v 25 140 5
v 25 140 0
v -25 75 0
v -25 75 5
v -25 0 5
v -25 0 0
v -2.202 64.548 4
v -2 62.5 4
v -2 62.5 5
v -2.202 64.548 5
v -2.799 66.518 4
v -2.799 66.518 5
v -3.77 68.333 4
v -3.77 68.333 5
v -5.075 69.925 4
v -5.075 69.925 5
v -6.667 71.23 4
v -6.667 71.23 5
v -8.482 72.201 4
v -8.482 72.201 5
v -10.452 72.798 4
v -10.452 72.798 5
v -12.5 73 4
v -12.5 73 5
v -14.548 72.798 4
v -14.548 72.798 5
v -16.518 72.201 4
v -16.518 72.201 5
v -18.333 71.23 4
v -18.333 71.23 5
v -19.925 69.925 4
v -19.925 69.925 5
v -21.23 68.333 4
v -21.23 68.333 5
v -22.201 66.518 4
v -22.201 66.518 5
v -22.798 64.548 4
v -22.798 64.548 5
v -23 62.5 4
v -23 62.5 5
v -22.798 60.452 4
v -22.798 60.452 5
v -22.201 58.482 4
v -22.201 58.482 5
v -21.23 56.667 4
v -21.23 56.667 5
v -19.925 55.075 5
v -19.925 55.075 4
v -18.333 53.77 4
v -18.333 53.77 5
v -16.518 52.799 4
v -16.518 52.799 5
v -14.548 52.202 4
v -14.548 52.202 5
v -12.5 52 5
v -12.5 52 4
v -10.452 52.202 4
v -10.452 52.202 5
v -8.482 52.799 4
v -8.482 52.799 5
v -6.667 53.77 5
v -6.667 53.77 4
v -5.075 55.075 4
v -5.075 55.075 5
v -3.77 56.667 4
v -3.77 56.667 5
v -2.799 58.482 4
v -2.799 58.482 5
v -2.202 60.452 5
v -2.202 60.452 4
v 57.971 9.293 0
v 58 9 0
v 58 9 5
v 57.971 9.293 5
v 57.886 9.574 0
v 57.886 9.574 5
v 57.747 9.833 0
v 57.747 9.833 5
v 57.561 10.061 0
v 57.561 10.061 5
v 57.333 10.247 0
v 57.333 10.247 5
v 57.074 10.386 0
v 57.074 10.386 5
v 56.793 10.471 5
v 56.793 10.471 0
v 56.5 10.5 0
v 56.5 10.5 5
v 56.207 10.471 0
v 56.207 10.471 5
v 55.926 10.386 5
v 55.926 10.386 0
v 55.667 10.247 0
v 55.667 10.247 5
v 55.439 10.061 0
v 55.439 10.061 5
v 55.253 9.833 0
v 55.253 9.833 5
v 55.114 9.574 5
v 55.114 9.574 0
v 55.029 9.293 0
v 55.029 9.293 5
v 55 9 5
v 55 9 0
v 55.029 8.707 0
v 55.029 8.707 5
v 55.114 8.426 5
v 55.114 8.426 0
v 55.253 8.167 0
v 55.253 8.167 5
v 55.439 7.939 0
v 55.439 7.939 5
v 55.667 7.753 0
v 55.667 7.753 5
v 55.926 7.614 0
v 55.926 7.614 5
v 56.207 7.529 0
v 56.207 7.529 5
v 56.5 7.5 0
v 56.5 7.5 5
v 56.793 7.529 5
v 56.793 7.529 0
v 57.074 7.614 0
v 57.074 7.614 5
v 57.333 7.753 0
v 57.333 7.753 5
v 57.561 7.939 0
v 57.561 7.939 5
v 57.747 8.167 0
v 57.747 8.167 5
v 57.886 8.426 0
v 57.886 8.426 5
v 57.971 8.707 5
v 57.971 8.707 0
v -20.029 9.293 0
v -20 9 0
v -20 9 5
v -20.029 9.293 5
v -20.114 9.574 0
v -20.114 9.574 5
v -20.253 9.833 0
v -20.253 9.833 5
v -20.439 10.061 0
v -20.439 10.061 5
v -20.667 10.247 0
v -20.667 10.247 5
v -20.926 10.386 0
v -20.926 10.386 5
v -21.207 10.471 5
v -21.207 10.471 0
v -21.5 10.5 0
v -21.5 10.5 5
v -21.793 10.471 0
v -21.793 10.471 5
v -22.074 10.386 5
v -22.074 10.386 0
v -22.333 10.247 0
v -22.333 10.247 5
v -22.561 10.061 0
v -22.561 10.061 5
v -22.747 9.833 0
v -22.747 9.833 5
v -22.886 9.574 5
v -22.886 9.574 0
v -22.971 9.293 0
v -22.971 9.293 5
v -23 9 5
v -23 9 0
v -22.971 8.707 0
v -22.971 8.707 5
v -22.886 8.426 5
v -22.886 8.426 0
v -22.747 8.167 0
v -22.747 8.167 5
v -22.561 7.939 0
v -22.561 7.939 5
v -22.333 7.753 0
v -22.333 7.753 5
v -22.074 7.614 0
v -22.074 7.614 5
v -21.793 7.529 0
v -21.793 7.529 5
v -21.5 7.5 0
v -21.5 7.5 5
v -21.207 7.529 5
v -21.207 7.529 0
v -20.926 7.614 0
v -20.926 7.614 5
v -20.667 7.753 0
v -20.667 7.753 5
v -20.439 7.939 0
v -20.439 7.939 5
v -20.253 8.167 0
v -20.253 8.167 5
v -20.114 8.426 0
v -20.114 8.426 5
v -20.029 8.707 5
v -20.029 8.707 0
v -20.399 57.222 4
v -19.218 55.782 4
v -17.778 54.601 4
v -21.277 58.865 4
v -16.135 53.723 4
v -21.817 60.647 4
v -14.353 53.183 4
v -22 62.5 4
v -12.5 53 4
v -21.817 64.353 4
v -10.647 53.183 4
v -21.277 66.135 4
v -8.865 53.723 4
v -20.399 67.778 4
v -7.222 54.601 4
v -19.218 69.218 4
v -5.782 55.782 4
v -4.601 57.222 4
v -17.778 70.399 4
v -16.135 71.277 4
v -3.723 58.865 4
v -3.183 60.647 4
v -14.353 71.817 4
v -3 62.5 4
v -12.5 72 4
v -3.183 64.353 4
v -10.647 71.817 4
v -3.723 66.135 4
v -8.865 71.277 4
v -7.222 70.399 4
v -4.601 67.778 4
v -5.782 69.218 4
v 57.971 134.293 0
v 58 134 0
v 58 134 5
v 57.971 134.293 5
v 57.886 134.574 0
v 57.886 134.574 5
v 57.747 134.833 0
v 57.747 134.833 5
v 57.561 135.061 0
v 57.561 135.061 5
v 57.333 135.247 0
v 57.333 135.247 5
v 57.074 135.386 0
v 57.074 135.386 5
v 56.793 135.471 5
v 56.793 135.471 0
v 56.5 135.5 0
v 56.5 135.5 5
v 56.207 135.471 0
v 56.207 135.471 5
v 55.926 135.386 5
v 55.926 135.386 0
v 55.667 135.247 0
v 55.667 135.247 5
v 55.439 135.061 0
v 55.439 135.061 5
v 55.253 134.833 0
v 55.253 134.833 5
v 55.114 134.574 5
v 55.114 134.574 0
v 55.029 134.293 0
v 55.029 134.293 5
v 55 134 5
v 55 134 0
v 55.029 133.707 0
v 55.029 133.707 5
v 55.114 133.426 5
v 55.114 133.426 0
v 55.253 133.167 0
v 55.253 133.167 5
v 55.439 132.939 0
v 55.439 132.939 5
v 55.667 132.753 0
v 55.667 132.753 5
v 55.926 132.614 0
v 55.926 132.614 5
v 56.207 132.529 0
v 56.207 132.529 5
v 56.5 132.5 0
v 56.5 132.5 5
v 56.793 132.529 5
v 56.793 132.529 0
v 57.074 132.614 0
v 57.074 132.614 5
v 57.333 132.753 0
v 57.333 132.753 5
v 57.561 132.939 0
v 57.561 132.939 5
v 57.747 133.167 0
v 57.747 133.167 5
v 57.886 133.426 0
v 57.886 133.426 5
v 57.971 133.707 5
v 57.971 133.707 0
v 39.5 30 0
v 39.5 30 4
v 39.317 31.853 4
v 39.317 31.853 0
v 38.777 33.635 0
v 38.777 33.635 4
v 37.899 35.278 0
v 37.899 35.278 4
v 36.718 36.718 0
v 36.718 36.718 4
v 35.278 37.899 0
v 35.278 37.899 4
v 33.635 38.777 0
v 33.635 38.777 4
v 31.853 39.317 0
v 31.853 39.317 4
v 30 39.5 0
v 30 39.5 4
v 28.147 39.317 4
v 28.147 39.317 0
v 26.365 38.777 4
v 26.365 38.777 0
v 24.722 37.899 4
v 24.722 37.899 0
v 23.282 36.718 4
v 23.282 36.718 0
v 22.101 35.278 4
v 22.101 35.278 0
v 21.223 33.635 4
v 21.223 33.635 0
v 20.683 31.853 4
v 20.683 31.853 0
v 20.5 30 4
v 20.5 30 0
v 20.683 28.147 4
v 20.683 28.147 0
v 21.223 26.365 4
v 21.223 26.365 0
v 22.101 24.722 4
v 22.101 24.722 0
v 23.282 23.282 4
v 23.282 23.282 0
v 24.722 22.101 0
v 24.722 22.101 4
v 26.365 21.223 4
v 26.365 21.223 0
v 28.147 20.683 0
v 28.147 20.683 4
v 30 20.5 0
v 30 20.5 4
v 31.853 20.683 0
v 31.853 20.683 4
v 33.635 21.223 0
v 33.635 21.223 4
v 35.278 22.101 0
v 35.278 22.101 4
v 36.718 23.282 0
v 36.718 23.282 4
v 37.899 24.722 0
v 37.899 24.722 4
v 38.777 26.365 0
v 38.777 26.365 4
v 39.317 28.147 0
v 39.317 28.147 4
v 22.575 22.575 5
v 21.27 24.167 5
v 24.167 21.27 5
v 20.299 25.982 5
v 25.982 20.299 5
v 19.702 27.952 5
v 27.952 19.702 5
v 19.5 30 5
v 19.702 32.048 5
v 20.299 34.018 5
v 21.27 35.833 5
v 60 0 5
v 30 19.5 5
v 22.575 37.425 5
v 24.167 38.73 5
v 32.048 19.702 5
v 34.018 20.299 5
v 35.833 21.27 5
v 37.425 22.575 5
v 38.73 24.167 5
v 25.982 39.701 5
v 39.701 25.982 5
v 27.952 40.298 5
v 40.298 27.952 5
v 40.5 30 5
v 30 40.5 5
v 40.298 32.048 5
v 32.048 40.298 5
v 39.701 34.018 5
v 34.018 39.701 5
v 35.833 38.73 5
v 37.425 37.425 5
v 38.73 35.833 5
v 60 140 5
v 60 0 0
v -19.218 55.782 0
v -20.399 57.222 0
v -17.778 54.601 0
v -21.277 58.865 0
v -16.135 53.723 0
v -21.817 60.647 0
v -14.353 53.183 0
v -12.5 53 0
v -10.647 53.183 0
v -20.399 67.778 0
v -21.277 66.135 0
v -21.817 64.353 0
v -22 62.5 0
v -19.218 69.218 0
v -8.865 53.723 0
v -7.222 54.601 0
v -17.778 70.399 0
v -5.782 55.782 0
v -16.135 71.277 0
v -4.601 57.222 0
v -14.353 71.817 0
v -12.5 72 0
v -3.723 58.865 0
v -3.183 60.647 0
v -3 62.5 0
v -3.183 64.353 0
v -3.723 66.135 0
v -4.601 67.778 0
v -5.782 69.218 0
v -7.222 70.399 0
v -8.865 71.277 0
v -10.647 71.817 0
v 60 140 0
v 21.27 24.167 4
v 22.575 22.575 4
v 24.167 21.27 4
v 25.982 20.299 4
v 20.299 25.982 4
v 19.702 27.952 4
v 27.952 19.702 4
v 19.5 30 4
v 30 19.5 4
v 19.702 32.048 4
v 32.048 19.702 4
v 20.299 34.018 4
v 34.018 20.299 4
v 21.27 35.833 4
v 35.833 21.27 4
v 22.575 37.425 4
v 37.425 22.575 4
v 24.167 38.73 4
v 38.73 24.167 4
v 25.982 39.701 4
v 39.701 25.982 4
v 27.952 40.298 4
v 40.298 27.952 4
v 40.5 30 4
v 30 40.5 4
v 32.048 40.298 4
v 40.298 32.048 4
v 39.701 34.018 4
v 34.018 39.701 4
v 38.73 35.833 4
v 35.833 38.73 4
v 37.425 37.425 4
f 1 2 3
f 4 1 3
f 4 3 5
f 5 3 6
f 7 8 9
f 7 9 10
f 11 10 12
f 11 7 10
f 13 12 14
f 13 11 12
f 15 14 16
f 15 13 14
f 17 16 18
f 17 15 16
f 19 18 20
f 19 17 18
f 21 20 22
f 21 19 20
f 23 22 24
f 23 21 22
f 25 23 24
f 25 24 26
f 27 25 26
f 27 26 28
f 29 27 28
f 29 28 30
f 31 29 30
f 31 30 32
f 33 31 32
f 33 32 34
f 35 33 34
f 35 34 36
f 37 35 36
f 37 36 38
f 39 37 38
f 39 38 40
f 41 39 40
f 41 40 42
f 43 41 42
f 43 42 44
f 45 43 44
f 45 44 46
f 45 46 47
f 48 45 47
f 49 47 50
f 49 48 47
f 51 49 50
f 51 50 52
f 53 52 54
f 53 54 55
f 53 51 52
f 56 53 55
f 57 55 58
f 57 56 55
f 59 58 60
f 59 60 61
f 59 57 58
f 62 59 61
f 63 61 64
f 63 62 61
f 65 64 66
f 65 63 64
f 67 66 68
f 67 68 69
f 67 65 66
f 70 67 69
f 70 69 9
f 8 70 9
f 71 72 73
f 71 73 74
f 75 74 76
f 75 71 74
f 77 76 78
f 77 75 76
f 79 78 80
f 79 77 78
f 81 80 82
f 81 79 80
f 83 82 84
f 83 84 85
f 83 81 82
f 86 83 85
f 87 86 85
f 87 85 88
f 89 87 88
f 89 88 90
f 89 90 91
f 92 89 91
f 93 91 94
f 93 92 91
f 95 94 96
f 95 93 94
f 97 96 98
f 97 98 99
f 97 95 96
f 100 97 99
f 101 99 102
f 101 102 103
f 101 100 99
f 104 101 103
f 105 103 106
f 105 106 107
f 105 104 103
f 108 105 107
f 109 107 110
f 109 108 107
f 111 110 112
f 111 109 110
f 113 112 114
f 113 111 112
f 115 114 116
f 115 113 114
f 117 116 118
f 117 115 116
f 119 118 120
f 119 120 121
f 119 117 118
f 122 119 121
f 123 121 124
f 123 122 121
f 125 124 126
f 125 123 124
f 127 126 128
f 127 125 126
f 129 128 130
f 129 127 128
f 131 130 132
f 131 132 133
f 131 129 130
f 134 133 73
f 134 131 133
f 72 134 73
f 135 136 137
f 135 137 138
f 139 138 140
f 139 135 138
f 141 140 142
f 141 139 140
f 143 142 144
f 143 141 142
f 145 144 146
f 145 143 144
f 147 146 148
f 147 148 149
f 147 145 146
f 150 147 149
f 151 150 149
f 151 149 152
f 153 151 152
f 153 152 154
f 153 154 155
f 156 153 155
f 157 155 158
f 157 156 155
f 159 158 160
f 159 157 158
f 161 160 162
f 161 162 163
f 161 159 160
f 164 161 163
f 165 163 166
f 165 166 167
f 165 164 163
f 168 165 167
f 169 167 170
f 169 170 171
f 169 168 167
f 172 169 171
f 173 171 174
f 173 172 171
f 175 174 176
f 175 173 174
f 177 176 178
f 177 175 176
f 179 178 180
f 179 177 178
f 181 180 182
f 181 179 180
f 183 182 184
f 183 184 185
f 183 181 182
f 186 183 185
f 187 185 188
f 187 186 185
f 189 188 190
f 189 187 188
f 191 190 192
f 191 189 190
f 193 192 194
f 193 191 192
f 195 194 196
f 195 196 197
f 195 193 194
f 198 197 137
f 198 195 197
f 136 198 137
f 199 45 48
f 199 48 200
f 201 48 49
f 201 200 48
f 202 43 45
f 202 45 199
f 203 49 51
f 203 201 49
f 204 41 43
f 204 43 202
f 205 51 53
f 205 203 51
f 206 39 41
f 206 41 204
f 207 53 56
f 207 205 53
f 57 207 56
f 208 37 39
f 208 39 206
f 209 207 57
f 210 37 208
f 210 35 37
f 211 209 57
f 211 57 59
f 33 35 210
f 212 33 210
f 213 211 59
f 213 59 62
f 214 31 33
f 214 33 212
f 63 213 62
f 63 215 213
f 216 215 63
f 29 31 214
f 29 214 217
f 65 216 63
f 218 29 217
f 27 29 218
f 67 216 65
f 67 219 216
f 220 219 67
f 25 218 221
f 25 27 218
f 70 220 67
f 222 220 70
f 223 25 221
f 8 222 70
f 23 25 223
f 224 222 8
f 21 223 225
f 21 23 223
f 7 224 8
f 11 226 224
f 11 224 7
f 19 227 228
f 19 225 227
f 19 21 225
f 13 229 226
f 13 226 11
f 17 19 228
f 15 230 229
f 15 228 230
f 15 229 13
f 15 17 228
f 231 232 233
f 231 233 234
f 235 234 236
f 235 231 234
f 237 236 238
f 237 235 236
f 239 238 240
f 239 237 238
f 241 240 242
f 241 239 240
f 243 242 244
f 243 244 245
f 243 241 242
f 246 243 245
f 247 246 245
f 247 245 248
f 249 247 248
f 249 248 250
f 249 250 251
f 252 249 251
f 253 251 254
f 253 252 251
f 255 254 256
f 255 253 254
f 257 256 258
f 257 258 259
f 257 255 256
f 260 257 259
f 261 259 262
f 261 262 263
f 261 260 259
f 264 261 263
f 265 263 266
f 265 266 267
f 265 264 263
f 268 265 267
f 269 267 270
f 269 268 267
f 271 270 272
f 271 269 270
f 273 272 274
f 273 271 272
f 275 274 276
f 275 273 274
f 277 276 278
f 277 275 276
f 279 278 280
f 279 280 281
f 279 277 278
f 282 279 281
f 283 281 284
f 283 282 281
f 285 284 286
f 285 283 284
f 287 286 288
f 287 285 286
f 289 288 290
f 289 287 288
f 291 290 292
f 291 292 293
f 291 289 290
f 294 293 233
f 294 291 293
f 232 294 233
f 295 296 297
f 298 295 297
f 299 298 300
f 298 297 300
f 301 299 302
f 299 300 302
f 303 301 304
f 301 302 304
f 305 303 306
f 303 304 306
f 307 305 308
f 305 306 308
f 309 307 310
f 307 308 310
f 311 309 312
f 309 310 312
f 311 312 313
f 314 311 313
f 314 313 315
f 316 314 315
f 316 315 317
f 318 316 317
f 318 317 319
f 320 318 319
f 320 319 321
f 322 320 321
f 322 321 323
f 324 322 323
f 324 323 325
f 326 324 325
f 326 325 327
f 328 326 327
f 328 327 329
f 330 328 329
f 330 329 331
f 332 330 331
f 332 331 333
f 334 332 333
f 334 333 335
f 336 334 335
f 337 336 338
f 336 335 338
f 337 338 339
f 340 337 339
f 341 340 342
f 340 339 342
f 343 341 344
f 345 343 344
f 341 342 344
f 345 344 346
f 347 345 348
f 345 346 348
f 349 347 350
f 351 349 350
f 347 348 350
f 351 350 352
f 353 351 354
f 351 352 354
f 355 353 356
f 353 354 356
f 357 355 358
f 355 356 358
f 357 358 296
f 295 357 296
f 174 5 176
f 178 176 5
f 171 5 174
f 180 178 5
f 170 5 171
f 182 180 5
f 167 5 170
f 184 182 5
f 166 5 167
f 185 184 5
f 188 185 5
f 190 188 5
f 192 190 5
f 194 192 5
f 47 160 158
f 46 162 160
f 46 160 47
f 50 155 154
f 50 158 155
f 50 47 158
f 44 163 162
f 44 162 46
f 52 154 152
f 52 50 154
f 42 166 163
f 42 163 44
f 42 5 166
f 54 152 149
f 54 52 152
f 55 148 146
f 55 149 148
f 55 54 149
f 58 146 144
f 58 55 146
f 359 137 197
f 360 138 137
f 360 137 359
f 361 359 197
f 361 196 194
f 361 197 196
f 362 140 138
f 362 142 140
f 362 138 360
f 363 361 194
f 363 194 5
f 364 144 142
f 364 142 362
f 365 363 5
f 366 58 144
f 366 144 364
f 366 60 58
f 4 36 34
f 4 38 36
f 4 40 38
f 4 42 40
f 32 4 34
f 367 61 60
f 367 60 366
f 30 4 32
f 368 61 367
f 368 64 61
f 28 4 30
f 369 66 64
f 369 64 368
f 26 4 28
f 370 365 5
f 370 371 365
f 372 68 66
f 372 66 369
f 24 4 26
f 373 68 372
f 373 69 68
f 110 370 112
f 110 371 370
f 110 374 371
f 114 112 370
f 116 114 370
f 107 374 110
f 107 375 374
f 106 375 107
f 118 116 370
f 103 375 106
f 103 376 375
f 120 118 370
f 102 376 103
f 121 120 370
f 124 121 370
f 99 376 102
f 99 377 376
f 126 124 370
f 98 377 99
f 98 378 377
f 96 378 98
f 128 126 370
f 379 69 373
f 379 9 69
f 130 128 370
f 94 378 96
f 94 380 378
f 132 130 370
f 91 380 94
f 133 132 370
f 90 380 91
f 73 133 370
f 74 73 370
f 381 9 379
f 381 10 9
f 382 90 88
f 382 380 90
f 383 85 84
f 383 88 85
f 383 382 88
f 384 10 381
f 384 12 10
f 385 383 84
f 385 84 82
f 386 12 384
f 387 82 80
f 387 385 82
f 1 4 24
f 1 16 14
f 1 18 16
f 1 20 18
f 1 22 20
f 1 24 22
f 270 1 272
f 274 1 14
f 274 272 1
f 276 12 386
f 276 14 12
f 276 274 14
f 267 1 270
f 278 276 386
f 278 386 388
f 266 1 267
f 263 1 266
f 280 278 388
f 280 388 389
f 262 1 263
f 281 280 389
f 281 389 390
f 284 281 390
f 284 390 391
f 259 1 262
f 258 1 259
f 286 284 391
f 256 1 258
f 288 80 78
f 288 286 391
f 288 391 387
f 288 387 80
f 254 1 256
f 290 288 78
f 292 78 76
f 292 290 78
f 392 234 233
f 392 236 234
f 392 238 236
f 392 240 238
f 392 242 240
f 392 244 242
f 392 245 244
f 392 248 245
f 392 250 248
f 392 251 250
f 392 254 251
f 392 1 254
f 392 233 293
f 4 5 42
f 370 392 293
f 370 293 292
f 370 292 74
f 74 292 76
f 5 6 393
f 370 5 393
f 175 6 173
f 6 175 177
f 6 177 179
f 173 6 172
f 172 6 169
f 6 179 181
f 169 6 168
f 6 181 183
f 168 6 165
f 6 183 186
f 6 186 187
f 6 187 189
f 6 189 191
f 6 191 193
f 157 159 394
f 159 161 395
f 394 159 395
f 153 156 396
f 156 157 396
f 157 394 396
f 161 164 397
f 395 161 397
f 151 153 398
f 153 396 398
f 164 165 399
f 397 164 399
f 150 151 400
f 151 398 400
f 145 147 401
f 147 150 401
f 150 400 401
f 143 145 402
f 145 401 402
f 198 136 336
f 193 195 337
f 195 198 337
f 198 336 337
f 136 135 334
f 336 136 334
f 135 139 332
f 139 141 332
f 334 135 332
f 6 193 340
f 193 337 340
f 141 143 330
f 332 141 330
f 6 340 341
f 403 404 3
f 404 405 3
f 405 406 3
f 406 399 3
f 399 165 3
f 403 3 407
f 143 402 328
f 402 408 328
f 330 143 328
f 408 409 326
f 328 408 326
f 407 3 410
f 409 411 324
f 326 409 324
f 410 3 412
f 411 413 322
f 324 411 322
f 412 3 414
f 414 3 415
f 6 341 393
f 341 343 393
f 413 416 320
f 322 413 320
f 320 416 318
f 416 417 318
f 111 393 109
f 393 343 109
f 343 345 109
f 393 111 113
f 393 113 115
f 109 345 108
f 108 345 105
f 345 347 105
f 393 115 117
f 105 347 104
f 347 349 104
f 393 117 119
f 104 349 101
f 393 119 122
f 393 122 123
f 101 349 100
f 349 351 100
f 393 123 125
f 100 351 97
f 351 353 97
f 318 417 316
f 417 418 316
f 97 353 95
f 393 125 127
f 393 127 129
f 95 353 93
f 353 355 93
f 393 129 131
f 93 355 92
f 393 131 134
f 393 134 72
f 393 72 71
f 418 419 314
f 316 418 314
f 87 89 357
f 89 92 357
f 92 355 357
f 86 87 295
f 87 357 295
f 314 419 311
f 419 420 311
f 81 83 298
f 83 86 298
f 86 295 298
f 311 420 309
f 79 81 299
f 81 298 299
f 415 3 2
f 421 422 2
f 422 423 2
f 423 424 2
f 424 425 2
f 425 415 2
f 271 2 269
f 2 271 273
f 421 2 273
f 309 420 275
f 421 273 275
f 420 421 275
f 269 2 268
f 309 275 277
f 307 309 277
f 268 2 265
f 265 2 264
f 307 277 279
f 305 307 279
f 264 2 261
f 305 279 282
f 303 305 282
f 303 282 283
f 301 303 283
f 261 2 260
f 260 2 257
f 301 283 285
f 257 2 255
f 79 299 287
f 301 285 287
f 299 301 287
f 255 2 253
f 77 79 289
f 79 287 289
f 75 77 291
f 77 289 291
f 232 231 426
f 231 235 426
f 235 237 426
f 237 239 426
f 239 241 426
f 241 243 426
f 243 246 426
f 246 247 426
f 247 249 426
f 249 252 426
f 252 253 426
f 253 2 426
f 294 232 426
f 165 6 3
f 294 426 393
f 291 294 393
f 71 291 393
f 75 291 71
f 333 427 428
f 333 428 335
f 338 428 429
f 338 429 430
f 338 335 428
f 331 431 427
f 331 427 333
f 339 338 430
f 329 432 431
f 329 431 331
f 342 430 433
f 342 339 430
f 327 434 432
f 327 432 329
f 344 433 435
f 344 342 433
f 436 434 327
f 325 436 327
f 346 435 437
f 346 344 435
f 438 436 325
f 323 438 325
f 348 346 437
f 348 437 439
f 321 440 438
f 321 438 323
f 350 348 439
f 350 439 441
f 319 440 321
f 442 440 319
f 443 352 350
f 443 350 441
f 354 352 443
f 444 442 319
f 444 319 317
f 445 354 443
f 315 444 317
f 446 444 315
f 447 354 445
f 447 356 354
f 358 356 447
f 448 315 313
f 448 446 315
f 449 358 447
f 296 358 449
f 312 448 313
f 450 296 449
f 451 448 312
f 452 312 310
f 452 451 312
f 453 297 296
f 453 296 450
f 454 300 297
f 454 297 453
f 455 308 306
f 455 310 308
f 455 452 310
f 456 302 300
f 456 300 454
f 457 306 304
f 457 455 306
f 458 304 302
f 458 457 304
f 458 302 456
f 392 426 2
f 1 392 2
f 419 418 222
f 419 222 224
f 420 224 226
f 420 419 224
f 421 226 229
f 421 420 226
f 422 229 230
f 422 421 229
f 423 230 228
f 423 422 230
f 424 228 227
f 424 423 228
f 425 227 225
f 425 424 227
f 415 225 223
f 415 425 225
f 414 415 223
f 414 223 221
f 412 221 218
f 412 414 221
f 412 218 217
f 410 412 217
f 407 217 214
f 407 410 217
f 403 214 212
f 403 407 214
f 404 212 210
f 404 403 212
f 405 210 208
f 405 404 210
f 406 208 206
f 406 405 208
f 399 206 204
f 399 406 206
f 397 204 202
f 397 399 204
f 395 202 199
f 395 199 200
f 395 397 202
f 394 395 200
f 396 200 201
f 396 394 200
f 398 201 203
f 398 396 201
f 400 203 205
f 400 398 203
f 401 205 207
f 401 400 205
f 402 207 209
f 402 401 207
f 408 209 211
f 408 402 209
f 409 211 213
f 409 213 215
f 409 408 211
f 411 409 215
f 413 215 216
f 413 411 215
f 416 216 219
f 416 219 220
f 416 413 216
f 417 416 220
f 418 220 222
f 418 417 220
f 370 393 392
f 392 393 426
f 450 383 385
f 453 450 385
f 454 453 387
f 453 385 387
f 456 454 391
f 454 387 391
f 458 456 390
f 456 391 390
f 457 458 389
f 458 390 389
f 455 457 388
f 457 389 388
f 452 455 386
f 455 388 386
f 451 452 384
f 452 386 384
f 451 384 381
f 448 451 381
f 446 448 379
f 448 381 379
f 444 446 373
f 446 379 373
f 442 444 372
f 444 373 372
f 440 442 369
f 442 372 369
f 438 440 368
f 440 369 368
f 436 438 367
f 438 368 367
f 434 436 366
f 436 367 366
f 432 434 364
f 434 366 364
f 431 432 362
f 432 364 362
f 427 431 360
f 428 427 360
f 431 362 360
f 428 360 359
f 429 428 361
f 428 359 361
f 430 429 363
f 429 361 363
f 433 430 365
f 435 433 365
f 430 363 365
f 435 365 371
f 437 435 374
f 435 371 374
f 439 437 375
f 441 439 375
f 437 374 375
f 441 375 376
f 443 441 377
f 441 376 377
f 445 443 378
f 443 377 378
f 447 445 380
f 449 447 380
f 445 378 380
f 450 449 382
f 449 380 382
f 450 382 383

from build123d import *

# Parameters (mm, degrees)
SKETCH1_R           = 1.5
SKETCH1_R_2         = 10.5
BOSS_EXTRUDE1_DEPTH = 5
SKETCH1_3_R         = 10.5
SKETCH1_3_R_2       = 9.5
BOSS_EXTRUDE2_DEPTH = 4
SKETCH3_3_R         = 9.5
CUT_EXTRUDE2_DEPTH  = 5
SKETCH3_R           = 10.5
SKETCH3_R_2         = 9.5
CUT_EXTRUDE3_DEPTH  = 1


with BuildPart() as part:
    # Sketch1 → Boss-Extrude1 (new body)
    # profile 1 of 2: a face of its own
    with BuildSketch(Plane.XY):
        Polygon((-25, 0), (0, 0), (50, 0), (60, 0), (60, 140), (50, 140), (50, 75), (-25, 75), align=None)
        with Locations((-21.5, 9)):
            Circle(SKETCH1_R, mode=Mode.SUBTRACT)
        with Locations((-12.5, 62.5)):
            Circle(SKETCH1_R_2, mode=Mode.SUBTRACT)
        with Locations((56.5, 9)):
            Circle(SKETCH1_R, mode=Mode.SUBTRACT)
        with Locations((56.5, 134)):
            Circle(SKETCH1_R, mode=Mode.SUBTRACT)
    # profile 2 of 2: a face of its own
    with BuildSketch(Plane.XY):
        Polygon((25, 140), (-25, 75), (50, 75), (50, 140), align=None)
    extrude(amount=BOSS_EXTRUDE1_DEPTH)

    # Sketch1<3> → Boss-Extrude2 (add)
    with BuildSketch(Plane.XY):
        with Locations((-12.5, 62.5)):
            Circle(SKETCH1_3_R)
        with Locations((-12.5, 62.5)):
            Circle(SKETCH1_3_R_2, mode=Mode.SUBTRACT)
    extrude(amount=BOSS_EXTRUDE2_DEPTH)

    # Sketch3<3> → Cut-Extrude2 (cut)
    with BuildSketch(Plane.XY.offset(5)):
        with Locations((30, 30)):
            Circle(SKETCH3_3_R)
    extrude(amount=-CUT_EXTRUDE2_DEPTH, mode=Mode.SUBTRACT)

    # Sketch3 → Cut-Extrude3 (cut)
    with BuildSketch(Plane.XY.offset(5)):
        with Locations((30, 30)):
            Circle(SKETCH3_R)
        with Locations((30, 30)):
            Circle(SKETCH3_R_2, mode=Mode.SUBTRACT)
    extrude(amount=-CUT_EXTRUDE3_DEPTH, mode=Mode.SUBTRACT)


solid = part.part
